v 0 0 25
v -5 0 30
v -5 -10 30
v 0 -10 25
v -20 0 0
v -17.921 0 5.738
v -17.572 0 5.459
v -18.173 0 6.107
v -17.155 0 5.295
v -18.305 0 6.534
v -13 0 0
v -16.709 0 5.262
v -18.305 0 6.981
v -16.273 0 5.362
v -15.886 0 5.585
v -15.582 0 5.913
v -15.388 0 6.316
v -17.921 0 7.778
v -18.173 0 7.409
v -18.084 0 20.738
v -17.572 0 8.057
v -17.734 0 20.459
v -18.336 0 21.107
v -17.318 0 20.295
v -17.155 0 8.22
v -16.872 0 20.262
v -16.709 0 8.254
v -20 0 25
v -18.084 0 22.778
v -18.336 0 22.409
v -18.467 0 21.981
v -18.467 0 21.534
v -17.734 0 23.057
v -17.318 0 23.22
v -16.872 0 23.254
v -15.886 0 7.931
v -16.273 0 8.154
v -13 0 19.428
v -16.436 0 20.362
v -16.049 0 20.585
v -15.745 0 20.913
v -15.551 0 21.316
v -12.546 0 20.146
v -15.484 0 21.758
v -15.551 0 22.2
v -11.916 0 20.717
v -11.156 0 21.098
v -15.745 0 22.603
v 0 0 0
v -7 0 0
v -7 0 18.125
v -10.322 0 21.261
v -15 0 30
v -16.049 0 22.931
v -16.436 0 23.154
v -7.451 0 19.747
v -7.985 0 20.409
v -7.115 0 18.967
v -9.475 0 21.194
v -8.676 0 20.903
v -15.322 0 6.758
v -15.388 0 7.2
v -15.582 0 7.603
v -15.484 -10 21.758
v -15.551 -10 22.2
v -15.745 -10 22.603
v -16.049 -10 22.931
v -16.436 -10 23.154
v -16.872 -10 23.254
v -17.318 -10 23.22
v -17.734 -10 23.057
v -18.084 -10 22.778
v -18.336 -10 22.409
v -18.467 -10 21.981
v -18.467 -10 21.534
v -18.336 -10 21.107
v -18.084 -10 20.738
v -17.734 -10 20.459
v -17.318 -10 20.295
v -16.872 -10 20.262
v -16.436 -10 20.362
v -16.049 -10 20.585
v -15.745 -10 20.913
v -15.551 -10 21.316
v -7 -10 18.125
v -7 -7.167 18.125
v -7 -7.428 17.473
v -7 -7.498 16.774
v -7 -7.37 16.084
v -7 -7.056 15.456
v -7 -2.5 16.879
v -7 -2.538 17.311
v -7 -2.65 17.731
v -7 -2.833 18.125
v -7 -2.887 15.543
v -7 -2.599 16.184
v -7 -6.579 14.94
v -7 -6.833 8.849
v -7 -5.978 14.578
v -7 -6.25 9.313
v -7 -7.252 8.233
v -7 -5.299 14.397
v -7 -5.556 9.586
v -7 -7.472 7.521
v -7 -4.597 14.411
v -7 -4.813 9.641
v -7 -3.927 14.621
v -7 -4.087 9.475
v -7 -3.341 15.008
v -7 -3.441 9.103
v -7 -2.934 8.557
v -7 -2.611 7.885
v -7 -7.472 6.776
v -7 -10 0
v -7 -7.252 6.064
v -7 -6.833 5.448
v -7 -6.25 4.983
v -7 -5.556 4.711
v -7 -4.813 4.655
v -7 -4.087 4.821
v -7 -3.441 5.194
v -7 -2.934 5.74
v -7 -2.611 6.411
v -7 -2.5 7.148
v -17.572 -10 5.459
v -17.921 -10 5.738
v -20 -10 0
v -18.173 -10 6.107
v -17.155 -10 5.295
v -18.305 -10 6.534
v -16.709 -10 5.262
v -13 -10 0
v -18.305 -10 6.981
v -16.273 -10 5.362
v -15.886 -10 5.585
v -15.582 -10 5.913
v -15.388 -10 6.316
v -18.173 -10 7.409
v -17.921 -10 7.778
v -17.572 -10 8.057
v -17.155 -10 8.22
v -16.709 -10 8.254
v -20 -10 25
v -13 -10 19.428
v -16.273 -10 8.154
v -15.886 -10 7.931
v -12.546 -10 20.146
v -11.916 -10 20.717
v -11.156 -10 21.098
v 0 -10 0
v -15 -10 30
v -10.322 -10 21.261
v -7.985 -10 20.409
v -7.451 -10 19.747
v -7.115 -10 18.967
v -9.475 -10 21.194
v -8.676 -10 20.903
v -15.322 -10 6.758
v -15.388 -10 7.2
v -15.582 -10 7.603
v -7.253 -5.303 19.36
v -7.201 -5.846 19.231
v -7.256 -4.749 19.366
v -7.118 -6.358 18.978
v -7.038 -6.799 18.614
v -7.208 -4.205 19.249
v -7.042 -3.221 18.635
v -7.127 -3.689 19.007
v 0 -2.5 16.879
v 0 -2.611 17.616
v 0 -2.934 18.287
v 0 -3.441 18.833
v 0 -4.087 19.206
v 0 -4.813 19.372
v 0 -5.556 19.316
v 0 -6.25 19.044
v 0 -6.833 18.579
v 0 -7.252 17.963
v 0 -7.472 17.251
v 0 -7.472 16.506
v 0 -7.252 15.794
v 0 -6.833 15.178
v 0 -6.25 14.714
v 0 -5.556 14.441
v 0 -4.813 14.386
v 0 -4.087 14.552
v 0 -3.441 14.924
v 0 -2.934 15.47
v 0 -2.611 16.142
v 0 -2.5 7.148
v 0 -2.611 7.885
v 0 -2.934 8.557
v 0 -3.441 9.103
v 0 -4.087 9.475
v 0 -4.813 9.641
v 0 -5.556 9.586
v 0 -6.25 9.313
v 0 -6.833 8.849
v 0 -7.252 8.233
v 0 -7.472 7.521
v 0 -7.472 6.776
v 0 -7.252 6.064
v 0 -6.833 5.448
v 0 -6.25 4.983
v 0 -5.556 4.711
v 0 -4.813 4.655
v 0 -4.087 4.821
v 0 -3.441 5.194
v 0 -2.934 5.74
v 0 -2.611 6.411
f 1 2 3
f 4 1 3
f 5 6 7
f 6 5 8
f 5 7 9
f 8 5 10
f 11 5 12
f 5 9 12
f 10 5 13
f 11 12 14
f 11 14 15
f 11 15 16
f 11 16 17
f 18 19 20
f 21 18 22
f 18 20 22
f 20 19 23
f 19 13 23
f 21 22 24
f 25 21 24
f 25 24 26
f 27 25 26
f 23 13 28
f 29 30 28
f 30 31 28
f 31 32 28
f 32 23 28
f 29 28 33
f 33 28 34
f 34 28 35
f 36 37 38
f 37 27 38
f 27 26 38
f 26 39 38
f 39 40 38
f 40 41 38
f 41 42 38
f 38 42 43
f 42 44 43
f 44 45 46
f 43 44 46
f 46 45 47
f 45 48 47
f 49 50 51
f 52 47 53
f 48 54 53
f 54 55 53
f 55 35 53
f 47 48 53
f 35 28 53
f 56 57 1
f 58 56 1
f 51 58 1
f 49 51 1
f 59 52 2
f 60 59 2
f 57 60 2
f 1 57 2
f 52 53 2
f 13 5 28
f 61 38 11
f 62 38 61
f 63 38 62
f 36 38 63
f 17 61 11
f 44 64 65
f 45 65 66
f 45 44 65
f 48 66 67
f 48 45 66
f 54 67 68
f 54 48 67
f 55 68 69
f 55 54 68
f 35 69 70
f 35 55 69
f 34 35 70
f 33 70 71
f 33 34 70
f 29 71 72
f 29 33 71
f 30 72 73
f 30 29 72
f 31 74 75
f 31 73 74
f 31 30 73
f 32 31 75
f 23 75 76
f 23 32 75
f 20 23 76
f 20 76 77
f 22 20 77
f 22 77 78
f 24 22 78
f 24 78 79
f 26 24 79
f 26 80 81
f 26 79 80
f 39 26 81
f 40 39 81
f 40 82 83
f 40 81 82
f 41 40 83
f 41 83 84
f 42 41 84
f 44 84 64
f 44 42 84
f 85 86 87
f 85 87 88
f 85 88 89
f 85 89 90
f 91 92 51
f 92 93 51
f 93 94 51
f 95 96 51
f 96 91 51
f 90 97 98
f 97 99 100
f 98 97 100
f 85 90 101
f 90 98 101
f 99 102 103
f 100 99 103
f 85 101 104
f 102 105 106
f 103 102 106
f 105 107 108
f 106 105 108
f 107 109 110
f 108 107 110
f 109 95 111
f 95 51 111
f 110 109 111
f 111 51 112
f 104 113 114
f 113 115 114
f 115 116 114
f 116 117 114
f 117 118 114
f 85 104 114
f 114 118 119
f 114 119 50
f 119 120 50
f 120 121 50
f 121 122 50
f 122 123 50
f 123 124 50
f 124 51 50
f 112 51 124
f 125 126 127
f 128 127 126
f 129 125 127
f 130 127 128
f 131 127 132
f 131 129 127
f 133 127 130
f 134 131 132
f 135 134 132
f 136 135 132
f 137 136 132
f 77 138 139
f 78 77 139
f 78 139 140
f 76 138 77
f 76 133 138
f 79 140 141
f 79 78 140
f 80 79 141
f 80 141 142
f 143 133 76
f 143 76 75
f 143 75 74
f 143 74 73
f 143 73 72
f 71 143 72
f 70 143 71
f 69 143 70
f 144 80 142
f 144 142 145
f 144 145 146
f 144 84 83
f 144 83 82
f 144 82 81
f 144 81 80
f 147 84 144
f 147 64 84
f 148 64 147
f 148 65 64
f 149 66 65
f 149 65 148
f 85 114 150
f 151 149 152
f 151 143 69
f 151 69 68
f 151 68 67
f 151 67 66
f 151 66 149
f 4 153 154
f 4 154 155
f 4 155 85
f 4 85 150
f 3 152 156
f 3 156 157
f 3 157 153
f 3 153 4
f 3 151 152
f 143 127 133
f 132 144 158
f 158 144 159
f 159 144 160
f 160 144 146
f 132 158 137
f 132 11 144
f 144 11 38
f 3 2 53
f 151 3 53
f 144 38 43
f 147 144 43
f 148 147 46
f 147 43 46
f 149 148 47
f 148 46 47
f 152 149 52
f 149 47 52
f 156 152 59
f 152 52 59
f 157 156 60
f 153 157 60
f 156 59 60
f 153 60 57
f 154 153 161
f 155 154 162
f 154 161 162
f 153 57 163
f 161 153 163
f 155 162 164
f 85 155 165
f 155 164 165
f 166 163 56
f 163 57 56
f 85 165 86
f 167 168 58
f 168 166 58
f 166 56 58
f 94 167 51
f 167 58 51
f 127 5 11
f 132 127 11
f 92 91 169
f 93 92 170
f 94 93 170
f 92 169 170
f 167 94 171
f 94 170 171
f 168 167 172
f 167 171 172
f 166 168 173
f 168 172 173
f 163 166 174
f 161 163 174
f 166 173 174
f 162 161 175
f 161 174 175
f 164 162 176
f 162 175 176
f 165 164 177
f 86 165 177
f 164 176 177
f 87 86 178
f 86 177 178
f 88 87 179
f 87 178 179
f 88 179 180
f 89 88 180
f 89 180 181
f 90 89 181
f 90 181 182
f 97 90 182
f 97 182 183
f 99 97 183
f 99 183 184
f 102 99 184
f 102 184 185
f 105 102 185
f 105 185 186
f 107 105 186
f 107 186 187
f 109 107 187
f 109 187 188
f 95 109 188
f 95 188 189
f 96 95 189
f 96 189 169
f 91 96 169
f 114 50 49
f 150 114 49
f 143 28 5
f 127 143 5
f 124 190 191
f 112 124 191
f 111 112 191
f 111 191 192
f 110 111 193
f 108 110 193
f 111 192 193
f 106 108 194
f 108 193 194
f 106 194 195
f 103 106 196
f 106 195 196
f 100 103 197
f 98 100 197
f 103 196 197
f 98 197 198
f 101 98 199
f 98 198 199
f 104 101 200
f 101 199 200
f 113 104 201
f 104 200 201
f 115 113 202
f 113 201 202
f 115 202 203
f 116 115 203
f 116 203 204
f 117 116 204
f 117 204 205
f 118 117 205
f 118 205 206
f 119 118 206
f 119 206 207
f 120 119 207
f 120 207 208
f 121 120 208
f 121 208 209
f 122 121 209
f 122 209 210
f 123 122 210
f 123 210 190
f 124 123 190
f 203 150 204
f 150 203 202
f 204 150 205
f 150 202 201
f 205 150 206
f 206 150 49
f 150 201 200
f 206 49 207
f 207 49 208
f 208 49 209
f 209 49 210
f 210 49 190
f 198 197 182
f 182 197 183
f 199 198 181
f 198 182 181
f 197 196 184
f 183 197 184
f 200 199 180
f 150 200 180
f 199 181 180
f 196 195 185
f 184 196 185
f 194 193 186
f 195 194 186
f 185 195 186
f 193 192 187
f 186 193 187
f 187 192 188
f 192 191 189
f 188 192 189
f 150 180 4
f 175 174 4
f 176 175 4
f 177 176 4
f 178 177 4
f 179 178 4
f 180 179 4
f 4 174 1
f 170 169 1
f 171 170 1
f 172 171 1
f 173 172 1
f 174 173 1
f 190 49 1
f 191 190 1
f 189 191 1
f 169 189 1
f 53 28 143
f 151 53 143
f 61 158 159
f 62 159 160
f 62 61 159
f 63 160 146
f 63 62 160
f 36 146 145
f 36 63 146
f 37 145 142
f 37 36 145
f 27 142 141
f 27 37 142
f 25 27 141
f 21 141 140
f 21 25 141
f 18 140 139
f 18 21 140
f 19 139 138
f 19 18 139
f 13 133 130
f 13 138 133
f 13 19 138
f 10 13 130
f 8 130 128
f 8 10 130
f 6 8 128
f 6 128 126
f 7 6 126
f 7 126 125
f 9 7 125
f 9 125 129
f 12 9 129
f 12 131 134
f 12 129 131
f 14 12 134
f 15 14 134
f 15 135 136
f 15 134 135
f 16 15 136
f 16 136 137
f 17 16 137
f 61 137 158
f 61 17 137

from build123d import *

# Parameters (mm, degrees)
F1_DEPTH = 10
F2_SIZE  = 5
F3_R     = 2.5
F4_DEPTH = 10
F5_R     = 1.5
F6_DEPTH = 12


with BuildPart() as f1:
    # F0 (on Front) → F1 (new body)
    with BuildSketch(Plane.XZ):
        with BuildLine():
            Line((-7, 0), (0, 0))
            Line((0, 0), (0, 30))
            Line((0, 30), (-20, 30))
            Line((-20, 30), (-20, 0))
            Line((-20, 0), (-13, 0))
            Line((-13, 0), (-13, 19.427699))
            ThreePointArc((-13, 19.427699), (-9.474739, 21.19446), (-7, 18.124513))
            Line((-7, 18.124513), (-7, 0))
        make_face()
    extrude(amount=F1_DEPTH)

    # F2
    f2_edges = [f1.edges().sort_by_distance(p)[0] for p in [
        (0, -5, 30),
        (-20, -5, 30),
    ]]
    chamfer(f2_edges, length=F2_SIZE)

    # F3 (on face) → F4 (cut)
    with BuildSketch(Plane.YZ):
        with Locations((-5, 16.878698)):
            Circle(F3_R)
        with Locations((-5, 7.148258)):
            Circle(F3_R)
    extrude(amount=-F4_DEPTH, mode=Mode.SUBTRACT)

    # F5 (on Front) → F6 (cut)
    with BuildSketch(Plane.XZ):
        with Locations((-16.984137, 21.757886)):
            Circle(F5_R)
        with Locations((-16.821511, 6.757886)):
            Circle(F5_R)
    extrude(amount=F6_DEPTH, mode=Mode.SUBTRACT)


solid = f1.part
